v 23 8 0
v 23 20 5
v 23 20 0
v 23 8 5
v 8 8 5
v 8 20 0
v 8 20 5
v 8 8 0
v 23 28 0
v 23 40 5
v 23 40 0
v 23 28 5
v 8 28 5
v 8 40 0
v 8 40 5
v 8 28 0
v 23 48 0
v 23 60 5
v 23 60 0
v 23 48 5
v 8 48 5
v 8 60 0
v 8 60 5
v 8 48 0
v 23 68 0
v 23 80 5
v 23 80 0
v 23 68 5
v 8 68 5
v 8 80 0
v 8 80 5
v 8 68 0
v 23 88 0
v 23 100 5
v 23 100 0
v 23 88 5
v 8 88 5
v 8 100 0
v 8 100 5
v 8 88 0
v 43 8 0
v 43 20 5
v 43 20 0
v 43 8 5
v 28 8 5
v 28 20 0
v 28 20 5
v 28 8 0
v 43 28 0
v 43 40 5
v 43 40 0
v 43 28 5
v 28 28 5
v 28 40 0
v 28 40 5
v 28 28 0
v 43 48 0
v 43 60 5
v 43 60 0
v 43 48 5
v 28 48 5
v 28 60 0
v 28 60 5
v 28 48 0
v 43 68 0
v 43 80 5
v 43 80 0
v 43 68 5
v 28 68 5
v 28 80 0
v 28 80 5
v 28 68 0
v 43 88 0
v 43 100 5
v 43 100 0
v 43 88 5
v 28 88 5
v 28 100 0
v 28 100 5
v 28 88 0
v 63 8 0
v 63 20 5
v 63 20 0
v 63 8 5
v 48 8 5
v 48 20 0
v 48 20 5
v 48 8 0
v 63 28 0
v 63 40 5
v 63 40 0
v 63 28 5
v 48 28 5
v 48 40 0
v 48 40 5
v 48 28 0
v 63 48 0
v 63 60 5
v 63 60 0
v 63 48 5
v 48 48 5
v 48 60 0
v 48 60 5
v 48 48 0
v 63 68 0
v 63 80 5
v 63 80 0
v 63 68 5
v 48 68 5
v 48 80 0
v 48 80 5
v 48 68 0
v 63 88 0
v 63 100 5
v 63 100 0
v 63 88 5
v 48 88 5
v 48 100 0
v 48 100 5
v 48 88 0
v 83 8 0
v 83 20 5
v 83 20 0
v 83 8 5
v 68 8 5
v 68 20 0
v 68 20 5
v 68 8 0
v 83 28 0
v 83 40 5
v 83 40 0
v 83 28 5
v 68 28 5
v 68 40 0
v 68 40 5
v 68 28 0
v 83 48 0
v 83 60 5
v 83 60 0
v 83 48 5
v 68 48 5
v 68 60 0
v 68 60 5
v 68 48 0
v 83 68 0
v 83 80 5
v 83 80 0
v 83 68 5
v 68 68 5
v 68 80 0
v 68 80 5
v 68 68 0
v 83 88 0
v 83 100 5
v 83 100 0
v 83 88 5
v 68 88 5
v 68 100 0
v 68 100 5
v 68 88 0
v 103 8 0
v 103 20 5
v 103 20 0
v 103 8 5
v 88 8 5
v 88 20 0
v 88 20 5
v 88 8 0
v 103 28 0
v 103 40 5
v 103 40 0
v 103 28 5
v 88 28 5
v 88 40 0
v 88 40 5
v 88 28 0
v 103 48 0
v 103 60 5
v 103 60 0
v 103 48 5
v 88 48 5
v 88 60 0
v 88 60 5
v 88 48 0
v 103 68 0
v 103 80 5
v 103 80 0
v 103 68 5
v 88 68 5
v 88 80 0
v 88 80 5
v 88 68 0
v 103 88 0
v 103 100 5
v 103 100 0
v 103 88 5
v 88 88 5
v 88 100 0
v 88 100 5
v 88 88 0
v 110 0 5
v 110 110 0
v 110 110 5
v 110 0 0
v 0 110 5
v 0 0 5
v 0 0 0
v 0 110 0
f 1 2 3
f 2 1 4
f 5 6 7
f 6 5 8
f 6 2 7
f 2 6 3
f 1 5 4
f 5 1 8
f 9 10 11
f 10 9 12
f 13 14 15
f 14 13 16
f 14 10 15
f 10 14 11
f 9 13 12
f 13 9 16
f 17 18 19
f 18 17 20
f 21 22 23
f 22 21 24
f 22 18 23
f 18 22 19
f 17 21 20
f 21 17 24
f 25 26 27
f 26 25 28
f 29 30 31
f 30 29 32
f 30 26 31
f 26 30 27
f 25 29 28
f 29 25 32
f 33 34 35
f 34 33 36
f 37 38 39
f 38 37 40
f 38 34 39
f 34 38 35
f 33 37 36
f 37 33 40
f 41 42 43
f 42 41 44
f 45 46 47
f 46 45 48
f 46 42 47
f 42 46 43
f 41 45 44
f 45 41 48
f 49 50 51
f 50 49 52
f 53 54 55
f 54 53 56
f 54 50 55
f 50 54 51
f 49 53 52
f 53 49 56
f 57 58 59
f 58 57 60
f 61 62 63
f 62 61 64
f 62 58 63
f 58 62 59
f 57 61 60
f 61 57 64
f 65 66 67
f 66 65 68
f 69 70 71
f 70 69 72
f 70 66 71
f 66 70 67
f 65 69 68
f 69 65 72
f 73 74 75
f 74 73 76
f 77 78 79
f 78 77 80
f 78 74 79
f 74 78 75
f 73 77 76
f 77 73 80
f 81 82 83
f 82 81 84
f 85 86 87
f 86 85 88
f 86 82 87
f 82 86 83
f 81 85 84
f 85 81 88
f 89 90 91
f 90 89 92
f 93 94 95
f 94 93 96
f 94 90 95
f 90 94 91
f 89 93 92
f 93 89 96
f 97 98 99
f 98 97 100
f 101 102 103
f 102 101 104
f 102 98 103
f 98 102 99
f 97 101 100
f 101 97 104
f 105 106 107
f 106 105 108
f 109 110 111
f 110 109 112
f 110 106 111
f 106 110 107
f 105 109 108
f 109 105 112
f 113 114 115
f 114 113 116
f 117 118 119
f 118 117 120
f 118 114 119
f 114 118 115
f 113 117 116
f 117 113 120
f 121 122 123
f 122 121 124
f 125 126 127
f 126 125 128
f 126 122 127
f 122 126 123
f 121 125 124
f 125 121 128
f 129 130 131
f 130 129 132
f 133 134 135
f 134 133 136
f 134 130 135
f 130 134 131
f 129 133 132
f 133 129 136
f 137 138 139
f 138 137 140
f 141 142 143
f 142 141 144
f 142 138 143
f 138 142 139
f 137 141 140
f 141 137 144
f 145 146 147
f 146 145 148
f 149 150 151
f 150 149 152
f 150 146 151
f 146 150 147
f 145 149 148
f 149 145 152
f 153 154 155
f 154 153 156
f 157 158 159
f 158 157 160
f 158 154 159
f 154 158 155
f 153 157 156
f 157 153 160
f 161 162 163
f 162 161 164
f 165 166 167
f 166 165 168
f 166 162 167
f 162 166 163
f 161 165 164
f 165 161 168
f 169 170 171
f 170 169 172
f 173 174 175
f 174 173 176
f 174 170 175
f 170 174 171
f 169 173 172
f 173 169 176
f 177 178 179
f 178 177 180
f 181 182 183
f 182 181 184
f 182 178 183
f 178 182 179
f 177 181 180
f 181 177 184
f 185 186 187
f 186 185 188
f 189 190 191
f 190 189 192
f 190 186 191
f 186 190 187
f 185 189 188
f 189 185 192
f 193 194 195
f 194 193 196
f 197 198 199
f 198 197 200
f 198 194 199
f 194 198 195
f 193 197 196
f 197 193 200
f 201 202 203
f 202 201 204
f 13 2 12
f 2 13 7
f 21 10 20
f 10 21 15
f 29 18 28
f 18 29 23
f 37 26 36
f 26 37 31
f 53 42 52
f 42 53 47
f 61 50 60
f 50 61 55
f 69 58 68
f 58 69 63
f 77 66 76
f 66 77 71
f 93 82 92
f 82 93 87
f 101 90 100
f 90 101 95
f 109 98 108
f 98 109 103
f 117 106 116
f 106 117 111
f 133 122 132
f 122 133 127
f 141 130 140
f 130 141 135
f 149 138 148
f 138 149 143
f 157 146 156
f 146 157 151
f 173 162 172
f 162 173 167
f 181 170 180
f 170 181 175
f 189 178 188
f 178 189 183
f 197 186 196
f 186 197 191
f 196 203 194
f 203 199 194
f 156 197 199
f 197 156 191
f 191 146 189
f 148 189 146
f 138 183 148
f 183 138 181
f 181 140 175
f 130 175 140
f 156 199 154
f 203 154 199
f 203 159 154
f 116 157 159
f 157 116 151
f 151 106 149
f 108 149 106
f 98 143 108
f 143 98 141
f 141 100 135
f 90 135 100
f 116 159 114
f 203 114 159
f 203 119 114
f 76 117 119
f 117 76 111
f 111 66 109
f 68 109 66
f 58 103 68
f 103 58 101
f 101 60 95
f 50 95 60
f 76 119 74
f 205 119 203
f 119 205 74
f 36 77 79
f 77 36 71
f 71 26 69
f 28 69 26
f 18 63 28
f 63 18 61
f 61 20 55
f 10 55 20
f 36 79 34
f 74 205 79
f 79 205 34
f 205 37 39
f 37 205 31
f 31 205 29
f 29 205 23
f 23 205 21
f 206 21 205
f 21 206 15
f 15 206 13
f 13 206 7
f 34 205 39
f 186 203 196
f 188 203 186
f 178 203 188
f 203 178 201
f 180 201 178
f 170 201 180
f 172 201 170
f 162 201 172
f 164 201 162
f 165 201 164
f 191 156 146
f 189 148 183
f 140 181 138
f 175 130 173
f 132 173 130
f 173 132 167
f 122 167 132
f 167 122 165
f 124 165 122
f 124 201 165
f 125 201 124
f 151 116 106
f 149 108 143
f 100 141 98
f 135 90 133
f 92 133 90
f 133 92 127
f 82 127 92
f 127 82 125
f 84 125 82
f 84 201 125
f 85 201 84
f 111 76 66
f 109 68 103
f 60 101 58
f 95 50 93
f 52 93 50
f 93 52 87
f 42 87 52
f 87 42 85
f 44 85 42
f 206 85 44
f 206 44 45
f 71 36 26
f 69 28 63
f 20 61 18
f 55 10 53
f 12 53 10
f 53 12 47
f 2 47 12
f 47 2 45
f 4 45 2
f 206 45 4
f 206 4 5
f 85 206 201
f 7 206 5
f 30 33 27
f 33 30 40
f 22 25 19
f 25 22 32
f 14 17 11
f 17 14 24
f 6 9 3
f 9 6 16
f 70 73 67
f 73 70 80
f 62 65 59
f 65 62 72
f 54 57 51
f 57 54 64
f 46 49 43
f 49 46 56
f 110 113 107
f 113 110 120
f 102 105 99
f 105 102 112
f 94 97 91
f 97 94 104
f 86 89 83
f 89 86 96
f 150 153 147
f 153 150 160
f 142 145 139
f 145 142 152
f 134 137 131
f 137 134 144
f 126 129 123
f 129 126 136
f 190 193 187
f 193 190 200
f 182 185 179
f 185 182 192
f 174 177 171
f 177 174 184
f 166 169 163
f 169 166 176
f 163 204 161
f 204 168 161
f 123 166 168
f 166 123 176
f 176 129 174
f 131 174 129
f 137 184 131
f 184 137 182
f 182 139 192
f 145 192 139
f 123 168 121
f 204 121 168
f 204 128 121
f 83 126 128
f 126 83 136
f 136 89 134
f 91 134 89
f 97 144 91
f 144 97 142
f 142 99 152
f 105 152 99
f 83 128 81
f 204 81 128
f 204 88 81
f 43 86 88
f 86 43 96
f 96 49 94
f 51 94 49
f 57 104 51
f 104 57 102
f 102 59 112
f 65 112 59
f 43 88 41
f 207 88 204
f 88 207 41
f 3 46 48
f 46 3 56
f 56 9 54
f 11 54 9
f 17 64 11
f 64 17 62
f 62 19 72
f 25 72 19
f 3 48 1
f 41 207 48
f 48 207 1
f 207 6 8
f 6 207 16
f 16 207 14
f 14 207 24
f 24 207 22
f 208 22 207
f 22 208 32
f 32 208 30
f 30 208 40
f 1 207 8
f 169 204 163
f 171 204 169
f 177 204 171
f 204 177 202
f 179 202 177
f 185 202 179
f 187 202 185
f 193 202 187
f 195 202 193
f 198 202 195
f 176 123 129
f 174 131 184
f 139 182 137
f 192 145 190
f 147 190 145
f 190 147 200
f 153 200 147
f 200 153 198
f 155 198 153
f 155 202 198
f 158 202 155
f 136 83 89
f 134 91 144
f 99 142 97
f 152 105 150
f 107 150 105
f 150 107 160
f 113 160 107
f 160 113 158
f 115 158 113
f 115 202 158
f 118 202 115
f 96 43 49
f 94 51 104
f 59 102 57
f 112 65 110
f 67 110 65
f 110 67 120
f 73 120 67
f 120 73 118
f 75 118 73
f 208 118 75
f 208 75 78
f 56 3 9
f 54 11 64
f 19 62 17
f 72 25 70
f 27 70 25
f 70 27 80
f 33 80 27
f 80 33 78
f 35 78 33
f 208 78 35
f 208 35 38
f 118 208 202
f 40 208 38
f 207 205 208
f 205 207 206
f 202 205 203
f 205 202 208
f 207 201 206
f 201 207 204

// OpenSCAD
w = 110;
h = 110;
d = 5;

hw = 0.2;

difference(){
    cube([w,h,d]);
for (i = [8:20:90]){
    for(j = [8:20:90]){
        color("red")
        translate([i,j,-hw/2])
        cube([15,12,12]);
        }
    
 
}
}
